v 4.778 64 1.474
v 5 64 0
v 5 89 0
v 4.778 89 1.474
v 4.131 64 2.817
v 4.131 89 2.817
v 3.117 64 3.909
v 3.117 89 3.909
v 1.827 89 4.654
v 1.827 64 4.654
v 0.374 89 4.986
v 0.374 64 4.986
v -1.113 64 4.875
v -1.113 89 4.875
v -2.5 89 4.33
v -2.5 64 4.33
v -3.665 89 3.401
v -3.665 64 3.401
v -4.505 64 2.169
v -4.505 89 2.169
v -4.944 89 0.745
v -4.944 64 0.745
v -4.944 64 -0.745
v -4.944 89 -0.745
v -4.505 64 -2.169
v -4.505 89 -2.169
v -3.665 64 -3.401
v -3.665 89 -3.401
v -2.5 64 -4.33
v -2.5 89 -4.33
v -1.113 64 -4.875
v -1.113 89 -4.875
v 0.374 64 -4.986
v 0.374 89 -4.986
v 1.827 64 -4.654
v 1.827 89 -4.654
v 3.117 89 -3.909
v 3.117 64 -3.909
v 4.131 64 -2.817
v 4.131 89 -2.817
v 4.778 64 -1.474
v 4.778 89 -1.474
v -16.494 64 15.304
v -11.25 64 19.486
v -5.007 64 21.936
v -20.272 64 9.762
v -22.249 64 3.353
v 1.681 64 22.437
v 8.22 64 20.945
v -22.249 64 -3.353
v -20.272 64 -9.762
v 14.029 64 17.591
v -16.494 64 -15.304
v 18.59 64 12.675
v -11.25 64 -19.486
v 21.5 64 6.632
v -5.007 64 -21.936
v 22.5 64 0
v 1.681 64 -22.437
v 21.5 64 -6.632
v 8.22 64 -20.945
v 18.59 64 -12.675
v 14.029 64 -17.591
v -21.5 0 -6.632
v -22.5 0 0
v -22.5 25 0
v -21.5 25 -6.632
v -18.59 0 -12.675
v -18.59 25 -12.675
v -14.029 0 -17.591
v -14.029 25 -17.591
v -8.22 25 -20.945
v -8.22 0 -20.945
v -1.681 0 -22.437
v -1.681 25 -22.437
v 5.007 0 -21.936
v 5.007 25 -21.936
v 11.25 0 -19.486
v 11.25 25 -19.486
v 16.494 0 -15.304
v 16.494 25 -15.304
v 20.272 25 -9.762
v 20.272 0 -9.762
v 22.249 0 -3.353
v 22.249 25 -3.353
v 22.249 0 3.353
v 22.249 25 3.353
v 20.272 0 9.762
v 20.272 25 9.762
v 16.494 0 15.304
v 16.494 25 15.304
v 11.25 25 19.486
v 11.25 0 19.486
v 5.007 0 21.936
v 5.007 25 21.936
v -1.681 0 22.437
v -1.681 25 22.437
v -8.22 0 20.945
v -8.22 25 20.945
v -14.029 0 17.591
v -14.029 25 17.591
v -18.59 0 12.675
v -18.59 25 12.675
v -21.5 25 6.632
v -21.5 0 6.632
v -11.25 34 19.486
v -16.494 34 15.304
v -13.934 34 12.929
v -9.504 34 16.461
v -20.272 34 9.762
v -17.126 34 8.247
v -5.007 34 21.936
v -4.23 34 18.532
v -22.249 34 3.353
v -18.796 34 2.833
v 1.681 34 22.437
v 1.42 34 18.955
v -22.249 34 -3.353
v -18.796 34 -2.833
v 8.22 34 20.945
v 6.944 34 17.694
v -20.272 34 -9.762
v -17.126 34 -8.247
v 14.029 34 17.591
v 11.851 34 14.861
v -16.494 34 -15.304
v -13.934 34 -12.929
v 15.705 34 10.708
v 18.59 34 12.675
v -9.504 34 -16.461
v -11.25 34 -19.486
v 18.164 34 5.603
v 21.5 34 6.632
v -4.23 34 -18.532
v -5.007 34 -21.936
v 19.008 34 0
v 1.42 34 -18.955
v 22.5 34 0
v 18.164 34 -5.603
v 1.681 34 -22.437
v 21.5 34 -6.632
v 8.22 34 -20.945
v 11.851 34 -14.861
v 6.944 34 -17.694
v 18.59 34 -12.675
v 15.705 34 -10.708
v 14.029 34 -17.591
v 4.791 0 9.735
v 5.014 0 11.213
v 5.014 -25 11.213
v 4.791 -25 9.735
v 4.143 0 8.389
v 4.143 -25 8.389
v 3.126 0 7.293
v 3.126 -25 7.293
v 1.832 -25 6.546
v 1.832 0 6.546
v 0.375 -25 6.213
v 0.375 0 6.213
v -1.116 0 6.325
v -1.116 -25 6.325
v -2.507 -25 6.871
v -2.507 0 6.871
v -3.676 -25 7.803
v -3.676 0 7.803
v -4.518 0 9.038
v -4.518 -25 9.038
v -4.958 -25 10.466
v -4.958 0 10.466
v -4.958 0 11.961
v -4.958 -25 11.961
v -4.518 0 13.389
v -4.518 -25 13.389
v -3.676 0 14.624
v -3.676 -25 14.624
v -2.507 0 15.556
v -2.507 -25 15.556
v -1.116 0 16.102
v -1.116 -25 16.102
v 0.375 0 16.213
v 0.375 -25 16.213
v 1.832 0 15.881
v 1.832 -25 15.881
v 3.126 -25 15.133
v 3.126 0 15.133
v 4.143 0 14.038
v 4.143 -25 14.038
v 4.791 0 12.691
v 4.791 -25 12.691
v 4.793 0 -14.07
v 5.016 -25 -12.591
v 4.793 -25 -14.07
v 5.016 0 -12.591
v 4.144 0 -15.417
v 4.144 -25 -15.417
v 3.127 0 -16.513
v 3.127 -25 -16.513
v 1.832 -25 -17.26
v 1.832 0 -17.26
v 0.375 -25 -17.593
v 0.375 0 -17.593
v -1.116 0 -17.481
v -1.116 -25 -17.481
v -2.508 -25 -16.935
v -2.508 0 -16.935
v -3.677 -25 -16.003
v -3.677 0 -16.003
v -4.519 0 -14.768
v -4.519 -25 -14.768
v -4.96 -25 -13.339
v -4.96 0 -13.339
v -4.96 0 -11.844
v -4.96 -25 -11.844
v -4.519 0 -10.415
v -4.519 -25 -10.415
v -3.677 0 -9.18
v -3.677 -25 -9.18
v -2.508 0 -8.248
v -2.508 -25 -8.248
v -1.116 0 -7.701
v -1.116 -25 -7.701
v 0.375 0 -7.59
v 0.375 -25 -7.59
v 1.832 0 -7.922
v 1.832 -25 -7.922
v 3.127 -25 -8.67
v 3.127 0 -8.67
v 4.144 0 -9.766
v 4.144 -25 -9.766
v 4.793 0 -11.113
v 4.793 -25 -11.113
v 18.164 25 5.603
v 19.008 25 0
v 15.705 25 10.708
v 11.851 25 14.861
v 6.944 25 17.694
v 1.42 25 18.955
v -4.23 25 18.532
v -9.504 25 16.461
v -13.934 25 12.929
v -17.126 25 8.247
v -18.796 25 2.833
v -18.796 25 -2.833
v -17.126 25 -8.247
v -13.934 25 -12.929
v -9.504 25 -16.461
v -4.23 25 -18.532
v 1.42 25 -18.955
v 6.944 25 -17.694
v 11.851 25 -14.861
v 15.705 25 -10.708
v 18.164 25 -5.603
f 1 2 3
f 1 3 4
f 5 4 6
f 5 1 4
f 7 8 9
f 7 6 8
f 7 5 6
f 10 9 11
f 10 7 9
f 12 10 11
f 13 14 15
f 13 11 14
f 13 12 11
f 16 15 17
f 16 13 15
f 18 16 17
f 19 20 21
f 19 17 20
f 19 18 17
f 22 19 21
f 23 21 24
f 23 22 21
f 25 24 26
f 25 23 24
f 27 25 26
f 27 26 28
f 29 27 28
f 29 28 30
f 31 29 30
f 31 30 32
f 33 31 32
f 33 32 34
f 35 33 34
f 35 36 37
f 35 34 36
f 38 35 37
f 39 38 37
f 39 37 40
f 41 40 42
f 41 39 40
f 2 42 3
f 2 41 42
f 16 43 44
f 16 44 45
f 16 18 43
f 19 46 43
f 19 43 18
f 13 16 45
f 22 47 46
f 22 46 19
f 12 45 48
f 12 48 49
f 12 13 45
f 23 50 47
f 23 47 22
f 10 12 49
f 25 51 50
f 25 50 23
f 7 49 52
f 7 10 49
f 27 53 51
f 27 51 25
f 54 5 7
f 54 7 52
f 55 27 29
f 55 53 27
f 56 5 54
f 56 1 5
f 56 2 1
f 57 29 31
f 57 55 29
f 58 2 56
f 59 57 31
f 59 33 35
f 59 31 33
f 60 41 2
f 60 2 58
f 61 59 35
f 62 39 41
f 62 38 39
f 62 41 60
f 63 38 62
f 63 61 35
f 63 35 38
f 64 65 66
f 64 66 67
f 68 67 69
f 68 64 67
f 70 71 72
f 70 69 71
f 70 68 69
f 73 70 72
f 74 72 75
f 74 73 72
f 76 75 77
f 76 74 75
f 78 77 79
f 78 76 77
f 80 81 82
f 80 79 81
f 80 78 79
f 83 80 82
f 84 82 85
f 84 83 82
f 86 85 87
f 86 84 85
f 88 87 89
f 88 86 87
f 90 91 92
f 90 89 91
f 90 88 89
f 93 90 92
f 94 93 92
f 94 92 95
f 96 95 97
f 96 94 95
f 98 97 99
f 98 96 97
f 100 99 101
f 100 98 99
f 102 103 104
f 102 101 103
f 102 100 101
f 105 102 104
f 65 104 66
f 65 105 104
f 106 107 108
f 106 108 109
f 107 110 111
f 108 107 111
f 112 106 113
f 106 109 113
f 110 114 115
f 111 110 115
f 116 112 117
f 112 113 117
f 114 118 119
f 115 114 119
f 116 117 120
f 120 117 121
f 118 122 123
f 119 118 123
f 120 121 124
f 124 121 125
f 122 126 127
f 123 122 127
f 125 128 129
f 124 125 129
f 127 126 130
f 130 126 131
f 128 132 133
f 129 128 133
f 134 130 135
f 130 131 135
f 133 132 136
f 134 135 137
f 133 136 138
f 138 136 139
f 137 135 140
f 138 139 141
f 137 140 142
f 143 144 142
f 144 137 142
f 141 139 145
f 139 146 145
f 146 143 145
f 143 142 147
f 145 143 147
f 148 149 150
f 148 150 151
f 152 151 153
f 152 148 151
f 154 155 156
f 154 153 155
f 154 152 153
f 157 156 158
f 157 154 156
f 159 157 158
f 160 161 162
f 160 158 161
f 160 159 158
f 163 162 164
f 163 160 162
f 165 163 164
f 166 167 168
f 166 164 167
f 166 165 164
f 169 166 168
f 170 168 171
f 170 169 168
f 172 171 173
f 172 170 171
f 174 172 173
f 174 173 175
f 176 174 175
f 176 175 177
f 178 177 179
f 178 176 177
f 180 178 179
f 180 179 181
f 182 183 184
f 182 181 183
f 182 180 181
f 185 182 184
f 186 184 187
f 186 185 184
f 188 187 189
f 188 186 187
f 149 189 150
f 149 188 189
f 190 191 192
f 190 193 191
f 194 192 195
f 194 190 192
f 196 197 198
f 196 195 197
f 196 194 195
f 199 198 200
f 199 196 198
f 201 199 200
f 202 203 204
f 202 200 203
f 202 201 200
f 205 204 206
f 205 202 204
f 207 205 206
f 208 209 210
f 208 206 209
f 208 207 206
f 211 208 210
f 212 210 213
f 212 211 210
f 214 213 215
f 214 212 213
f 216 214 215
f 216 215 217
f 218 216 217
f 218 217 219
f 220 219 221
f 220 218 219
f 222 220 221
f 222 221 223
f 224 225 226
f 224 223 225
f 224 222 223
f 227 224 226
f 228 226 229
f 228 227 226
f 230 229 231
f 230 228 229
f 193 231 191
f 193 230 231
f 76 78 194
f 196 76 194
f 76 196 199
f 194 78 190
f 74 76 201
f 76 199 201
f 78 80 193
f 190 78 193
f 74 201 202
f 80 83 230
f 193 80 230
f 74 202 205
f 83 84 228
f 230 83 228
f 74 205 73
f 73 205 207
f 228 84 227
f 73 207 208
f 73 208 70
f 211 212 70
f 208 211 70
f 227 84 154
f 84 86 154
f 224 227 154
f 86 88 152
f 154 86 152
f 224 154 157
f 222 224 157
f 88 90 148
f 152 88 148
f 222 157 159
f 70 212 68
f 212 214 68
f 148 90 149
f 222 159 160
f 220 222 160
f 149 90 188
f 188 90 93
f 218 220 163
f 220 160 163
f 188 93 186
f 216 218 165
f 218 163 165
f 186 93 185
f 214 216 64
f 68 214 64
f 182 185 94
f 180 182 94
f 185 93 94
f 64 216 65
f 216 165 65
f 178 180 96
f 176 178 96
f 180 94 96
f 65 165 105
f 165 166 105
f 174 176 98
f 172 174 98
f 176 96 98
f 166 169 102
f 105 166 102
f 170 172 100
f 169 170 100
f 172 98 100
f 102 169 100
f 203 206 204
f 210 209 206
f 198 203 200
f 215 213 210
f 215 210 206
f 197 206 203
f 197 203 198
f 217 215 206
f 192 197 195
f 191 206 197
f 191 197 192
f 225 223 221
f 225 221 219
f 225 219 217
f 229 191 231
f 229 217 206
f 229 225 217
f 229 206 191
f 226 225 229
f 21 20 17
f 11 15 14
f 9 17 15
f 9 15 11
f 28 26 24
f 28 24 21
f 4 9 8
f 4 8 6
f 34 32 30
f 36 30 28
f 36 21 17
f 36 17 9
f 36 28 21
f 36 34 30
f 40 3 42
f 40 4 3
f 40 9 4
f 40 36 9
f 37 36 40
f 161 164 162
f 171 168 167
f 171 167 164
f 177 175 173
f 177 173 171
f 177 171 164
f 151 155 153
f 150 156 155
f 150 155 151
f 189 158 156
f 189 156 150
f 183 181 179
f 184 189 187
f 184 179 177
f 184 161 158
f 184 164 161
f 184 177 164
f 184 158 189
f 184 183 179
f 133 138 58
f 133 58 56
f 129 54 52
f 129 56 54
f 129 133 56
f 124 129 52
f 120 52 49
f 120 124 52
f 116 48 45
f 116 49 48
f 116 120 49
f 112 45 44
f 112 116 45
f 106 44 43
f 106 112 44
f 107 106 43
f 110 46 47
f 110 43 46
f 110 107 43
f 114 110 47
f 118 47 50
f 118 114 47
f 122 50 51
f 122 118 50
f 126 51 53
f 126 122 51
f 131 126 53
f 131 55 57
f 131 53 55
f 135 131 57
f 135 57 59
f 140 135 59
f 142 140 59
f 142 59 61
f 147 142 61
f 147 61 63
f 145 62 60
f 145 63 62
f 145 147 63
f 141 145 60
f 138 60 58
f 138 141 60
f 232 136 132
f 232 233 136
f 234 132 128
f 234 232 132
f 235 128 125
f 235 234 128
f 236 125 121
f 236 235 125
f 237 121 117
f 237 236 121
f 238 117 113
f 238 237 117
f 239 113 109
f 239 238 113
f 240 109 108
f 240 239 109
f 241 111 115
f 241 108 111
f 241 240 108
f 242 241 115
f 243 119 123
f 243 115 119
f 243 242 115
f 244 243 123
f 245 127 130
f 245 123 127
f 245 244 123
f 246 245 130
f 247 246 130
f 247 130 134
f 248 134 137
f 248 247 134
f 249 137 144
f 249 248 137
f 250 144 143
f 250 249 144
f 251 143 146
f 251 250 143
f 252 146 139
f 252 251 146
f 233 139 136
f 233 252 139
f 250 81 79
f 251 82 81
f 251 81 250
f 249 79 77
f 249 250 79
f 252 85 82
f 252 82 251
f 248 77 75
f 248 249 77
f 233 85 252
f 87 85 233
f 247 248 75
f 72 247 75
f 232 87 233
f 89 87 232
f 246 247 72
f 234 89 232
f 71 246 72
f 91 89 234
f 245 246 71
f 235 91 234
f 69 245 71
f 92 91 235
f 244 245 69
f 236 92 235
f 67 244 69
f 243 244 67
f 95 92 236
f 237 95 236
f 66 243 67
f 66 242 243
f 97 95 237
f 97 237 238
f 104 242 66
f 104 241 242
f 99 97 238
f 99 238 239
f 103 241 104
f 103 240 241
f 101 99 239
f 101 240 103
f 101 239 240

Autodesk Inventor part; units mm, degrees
ref_plane "YZ Plane" through (0, 0, 0) normal (1, 0, 0) x (0, 1, 0)
ref_plane "XZ Plane" through (0, 0, 0) normal (0, 1, 0) x (-1, 0, 0)
ref_plane "XY Plane" through (0, 0, 0) normal (0, 0, 1) x (1, 0, 0)
sketch "Sketch1" plane through (0, 0, 0) normal (0, 1, 0) x (-1, 0, 0)
  circle A0 centre (0, 0) radius 22.5
  dimension "d0" = 45
extrude "Extrusion1" add sketch "Sketch1" along normal blind 25
sketch "Sketch2" plane through (0, 25, 0) normal (0, 1, 0) x (1, 0, 0)
  circle A0 centre (0, 0) radius 19.0081
extrude "Extrusion2" add sketch "Sketch2" along normal blind 9
sketch "Sketch3" plane through (0, 34, 0) normal (0, 1, 0) x (1, 0, 0)
  circle A0 centre (0, 0) radius 22.5
extrude "Extrusion3" add sketch "Sketch3" along normal blind 30
sketch "Sketch4" plane through (0, 64, 0) normal (0, 1, 0) x (1, 0, 0)
  circle A0 centre (0, 0) radius 5
  dimension "d7" = 10
extrude "Extrusion4" add sketch "Sketch4" along normal blind 25
sketch "Sketch5" plane through (0, 0, 0) normal (0, -1, 0) x (1, 0, 0)
  circle A0 centre (0, 11.2132) radius 5.0141
  circle A1 centre (0, -12.5914) radius 5.0157
  point P0 (0, 0)
extrude "Extrusion5" add sketch "Sketch5" along normal blind 25
properties part number "DC motor now"
